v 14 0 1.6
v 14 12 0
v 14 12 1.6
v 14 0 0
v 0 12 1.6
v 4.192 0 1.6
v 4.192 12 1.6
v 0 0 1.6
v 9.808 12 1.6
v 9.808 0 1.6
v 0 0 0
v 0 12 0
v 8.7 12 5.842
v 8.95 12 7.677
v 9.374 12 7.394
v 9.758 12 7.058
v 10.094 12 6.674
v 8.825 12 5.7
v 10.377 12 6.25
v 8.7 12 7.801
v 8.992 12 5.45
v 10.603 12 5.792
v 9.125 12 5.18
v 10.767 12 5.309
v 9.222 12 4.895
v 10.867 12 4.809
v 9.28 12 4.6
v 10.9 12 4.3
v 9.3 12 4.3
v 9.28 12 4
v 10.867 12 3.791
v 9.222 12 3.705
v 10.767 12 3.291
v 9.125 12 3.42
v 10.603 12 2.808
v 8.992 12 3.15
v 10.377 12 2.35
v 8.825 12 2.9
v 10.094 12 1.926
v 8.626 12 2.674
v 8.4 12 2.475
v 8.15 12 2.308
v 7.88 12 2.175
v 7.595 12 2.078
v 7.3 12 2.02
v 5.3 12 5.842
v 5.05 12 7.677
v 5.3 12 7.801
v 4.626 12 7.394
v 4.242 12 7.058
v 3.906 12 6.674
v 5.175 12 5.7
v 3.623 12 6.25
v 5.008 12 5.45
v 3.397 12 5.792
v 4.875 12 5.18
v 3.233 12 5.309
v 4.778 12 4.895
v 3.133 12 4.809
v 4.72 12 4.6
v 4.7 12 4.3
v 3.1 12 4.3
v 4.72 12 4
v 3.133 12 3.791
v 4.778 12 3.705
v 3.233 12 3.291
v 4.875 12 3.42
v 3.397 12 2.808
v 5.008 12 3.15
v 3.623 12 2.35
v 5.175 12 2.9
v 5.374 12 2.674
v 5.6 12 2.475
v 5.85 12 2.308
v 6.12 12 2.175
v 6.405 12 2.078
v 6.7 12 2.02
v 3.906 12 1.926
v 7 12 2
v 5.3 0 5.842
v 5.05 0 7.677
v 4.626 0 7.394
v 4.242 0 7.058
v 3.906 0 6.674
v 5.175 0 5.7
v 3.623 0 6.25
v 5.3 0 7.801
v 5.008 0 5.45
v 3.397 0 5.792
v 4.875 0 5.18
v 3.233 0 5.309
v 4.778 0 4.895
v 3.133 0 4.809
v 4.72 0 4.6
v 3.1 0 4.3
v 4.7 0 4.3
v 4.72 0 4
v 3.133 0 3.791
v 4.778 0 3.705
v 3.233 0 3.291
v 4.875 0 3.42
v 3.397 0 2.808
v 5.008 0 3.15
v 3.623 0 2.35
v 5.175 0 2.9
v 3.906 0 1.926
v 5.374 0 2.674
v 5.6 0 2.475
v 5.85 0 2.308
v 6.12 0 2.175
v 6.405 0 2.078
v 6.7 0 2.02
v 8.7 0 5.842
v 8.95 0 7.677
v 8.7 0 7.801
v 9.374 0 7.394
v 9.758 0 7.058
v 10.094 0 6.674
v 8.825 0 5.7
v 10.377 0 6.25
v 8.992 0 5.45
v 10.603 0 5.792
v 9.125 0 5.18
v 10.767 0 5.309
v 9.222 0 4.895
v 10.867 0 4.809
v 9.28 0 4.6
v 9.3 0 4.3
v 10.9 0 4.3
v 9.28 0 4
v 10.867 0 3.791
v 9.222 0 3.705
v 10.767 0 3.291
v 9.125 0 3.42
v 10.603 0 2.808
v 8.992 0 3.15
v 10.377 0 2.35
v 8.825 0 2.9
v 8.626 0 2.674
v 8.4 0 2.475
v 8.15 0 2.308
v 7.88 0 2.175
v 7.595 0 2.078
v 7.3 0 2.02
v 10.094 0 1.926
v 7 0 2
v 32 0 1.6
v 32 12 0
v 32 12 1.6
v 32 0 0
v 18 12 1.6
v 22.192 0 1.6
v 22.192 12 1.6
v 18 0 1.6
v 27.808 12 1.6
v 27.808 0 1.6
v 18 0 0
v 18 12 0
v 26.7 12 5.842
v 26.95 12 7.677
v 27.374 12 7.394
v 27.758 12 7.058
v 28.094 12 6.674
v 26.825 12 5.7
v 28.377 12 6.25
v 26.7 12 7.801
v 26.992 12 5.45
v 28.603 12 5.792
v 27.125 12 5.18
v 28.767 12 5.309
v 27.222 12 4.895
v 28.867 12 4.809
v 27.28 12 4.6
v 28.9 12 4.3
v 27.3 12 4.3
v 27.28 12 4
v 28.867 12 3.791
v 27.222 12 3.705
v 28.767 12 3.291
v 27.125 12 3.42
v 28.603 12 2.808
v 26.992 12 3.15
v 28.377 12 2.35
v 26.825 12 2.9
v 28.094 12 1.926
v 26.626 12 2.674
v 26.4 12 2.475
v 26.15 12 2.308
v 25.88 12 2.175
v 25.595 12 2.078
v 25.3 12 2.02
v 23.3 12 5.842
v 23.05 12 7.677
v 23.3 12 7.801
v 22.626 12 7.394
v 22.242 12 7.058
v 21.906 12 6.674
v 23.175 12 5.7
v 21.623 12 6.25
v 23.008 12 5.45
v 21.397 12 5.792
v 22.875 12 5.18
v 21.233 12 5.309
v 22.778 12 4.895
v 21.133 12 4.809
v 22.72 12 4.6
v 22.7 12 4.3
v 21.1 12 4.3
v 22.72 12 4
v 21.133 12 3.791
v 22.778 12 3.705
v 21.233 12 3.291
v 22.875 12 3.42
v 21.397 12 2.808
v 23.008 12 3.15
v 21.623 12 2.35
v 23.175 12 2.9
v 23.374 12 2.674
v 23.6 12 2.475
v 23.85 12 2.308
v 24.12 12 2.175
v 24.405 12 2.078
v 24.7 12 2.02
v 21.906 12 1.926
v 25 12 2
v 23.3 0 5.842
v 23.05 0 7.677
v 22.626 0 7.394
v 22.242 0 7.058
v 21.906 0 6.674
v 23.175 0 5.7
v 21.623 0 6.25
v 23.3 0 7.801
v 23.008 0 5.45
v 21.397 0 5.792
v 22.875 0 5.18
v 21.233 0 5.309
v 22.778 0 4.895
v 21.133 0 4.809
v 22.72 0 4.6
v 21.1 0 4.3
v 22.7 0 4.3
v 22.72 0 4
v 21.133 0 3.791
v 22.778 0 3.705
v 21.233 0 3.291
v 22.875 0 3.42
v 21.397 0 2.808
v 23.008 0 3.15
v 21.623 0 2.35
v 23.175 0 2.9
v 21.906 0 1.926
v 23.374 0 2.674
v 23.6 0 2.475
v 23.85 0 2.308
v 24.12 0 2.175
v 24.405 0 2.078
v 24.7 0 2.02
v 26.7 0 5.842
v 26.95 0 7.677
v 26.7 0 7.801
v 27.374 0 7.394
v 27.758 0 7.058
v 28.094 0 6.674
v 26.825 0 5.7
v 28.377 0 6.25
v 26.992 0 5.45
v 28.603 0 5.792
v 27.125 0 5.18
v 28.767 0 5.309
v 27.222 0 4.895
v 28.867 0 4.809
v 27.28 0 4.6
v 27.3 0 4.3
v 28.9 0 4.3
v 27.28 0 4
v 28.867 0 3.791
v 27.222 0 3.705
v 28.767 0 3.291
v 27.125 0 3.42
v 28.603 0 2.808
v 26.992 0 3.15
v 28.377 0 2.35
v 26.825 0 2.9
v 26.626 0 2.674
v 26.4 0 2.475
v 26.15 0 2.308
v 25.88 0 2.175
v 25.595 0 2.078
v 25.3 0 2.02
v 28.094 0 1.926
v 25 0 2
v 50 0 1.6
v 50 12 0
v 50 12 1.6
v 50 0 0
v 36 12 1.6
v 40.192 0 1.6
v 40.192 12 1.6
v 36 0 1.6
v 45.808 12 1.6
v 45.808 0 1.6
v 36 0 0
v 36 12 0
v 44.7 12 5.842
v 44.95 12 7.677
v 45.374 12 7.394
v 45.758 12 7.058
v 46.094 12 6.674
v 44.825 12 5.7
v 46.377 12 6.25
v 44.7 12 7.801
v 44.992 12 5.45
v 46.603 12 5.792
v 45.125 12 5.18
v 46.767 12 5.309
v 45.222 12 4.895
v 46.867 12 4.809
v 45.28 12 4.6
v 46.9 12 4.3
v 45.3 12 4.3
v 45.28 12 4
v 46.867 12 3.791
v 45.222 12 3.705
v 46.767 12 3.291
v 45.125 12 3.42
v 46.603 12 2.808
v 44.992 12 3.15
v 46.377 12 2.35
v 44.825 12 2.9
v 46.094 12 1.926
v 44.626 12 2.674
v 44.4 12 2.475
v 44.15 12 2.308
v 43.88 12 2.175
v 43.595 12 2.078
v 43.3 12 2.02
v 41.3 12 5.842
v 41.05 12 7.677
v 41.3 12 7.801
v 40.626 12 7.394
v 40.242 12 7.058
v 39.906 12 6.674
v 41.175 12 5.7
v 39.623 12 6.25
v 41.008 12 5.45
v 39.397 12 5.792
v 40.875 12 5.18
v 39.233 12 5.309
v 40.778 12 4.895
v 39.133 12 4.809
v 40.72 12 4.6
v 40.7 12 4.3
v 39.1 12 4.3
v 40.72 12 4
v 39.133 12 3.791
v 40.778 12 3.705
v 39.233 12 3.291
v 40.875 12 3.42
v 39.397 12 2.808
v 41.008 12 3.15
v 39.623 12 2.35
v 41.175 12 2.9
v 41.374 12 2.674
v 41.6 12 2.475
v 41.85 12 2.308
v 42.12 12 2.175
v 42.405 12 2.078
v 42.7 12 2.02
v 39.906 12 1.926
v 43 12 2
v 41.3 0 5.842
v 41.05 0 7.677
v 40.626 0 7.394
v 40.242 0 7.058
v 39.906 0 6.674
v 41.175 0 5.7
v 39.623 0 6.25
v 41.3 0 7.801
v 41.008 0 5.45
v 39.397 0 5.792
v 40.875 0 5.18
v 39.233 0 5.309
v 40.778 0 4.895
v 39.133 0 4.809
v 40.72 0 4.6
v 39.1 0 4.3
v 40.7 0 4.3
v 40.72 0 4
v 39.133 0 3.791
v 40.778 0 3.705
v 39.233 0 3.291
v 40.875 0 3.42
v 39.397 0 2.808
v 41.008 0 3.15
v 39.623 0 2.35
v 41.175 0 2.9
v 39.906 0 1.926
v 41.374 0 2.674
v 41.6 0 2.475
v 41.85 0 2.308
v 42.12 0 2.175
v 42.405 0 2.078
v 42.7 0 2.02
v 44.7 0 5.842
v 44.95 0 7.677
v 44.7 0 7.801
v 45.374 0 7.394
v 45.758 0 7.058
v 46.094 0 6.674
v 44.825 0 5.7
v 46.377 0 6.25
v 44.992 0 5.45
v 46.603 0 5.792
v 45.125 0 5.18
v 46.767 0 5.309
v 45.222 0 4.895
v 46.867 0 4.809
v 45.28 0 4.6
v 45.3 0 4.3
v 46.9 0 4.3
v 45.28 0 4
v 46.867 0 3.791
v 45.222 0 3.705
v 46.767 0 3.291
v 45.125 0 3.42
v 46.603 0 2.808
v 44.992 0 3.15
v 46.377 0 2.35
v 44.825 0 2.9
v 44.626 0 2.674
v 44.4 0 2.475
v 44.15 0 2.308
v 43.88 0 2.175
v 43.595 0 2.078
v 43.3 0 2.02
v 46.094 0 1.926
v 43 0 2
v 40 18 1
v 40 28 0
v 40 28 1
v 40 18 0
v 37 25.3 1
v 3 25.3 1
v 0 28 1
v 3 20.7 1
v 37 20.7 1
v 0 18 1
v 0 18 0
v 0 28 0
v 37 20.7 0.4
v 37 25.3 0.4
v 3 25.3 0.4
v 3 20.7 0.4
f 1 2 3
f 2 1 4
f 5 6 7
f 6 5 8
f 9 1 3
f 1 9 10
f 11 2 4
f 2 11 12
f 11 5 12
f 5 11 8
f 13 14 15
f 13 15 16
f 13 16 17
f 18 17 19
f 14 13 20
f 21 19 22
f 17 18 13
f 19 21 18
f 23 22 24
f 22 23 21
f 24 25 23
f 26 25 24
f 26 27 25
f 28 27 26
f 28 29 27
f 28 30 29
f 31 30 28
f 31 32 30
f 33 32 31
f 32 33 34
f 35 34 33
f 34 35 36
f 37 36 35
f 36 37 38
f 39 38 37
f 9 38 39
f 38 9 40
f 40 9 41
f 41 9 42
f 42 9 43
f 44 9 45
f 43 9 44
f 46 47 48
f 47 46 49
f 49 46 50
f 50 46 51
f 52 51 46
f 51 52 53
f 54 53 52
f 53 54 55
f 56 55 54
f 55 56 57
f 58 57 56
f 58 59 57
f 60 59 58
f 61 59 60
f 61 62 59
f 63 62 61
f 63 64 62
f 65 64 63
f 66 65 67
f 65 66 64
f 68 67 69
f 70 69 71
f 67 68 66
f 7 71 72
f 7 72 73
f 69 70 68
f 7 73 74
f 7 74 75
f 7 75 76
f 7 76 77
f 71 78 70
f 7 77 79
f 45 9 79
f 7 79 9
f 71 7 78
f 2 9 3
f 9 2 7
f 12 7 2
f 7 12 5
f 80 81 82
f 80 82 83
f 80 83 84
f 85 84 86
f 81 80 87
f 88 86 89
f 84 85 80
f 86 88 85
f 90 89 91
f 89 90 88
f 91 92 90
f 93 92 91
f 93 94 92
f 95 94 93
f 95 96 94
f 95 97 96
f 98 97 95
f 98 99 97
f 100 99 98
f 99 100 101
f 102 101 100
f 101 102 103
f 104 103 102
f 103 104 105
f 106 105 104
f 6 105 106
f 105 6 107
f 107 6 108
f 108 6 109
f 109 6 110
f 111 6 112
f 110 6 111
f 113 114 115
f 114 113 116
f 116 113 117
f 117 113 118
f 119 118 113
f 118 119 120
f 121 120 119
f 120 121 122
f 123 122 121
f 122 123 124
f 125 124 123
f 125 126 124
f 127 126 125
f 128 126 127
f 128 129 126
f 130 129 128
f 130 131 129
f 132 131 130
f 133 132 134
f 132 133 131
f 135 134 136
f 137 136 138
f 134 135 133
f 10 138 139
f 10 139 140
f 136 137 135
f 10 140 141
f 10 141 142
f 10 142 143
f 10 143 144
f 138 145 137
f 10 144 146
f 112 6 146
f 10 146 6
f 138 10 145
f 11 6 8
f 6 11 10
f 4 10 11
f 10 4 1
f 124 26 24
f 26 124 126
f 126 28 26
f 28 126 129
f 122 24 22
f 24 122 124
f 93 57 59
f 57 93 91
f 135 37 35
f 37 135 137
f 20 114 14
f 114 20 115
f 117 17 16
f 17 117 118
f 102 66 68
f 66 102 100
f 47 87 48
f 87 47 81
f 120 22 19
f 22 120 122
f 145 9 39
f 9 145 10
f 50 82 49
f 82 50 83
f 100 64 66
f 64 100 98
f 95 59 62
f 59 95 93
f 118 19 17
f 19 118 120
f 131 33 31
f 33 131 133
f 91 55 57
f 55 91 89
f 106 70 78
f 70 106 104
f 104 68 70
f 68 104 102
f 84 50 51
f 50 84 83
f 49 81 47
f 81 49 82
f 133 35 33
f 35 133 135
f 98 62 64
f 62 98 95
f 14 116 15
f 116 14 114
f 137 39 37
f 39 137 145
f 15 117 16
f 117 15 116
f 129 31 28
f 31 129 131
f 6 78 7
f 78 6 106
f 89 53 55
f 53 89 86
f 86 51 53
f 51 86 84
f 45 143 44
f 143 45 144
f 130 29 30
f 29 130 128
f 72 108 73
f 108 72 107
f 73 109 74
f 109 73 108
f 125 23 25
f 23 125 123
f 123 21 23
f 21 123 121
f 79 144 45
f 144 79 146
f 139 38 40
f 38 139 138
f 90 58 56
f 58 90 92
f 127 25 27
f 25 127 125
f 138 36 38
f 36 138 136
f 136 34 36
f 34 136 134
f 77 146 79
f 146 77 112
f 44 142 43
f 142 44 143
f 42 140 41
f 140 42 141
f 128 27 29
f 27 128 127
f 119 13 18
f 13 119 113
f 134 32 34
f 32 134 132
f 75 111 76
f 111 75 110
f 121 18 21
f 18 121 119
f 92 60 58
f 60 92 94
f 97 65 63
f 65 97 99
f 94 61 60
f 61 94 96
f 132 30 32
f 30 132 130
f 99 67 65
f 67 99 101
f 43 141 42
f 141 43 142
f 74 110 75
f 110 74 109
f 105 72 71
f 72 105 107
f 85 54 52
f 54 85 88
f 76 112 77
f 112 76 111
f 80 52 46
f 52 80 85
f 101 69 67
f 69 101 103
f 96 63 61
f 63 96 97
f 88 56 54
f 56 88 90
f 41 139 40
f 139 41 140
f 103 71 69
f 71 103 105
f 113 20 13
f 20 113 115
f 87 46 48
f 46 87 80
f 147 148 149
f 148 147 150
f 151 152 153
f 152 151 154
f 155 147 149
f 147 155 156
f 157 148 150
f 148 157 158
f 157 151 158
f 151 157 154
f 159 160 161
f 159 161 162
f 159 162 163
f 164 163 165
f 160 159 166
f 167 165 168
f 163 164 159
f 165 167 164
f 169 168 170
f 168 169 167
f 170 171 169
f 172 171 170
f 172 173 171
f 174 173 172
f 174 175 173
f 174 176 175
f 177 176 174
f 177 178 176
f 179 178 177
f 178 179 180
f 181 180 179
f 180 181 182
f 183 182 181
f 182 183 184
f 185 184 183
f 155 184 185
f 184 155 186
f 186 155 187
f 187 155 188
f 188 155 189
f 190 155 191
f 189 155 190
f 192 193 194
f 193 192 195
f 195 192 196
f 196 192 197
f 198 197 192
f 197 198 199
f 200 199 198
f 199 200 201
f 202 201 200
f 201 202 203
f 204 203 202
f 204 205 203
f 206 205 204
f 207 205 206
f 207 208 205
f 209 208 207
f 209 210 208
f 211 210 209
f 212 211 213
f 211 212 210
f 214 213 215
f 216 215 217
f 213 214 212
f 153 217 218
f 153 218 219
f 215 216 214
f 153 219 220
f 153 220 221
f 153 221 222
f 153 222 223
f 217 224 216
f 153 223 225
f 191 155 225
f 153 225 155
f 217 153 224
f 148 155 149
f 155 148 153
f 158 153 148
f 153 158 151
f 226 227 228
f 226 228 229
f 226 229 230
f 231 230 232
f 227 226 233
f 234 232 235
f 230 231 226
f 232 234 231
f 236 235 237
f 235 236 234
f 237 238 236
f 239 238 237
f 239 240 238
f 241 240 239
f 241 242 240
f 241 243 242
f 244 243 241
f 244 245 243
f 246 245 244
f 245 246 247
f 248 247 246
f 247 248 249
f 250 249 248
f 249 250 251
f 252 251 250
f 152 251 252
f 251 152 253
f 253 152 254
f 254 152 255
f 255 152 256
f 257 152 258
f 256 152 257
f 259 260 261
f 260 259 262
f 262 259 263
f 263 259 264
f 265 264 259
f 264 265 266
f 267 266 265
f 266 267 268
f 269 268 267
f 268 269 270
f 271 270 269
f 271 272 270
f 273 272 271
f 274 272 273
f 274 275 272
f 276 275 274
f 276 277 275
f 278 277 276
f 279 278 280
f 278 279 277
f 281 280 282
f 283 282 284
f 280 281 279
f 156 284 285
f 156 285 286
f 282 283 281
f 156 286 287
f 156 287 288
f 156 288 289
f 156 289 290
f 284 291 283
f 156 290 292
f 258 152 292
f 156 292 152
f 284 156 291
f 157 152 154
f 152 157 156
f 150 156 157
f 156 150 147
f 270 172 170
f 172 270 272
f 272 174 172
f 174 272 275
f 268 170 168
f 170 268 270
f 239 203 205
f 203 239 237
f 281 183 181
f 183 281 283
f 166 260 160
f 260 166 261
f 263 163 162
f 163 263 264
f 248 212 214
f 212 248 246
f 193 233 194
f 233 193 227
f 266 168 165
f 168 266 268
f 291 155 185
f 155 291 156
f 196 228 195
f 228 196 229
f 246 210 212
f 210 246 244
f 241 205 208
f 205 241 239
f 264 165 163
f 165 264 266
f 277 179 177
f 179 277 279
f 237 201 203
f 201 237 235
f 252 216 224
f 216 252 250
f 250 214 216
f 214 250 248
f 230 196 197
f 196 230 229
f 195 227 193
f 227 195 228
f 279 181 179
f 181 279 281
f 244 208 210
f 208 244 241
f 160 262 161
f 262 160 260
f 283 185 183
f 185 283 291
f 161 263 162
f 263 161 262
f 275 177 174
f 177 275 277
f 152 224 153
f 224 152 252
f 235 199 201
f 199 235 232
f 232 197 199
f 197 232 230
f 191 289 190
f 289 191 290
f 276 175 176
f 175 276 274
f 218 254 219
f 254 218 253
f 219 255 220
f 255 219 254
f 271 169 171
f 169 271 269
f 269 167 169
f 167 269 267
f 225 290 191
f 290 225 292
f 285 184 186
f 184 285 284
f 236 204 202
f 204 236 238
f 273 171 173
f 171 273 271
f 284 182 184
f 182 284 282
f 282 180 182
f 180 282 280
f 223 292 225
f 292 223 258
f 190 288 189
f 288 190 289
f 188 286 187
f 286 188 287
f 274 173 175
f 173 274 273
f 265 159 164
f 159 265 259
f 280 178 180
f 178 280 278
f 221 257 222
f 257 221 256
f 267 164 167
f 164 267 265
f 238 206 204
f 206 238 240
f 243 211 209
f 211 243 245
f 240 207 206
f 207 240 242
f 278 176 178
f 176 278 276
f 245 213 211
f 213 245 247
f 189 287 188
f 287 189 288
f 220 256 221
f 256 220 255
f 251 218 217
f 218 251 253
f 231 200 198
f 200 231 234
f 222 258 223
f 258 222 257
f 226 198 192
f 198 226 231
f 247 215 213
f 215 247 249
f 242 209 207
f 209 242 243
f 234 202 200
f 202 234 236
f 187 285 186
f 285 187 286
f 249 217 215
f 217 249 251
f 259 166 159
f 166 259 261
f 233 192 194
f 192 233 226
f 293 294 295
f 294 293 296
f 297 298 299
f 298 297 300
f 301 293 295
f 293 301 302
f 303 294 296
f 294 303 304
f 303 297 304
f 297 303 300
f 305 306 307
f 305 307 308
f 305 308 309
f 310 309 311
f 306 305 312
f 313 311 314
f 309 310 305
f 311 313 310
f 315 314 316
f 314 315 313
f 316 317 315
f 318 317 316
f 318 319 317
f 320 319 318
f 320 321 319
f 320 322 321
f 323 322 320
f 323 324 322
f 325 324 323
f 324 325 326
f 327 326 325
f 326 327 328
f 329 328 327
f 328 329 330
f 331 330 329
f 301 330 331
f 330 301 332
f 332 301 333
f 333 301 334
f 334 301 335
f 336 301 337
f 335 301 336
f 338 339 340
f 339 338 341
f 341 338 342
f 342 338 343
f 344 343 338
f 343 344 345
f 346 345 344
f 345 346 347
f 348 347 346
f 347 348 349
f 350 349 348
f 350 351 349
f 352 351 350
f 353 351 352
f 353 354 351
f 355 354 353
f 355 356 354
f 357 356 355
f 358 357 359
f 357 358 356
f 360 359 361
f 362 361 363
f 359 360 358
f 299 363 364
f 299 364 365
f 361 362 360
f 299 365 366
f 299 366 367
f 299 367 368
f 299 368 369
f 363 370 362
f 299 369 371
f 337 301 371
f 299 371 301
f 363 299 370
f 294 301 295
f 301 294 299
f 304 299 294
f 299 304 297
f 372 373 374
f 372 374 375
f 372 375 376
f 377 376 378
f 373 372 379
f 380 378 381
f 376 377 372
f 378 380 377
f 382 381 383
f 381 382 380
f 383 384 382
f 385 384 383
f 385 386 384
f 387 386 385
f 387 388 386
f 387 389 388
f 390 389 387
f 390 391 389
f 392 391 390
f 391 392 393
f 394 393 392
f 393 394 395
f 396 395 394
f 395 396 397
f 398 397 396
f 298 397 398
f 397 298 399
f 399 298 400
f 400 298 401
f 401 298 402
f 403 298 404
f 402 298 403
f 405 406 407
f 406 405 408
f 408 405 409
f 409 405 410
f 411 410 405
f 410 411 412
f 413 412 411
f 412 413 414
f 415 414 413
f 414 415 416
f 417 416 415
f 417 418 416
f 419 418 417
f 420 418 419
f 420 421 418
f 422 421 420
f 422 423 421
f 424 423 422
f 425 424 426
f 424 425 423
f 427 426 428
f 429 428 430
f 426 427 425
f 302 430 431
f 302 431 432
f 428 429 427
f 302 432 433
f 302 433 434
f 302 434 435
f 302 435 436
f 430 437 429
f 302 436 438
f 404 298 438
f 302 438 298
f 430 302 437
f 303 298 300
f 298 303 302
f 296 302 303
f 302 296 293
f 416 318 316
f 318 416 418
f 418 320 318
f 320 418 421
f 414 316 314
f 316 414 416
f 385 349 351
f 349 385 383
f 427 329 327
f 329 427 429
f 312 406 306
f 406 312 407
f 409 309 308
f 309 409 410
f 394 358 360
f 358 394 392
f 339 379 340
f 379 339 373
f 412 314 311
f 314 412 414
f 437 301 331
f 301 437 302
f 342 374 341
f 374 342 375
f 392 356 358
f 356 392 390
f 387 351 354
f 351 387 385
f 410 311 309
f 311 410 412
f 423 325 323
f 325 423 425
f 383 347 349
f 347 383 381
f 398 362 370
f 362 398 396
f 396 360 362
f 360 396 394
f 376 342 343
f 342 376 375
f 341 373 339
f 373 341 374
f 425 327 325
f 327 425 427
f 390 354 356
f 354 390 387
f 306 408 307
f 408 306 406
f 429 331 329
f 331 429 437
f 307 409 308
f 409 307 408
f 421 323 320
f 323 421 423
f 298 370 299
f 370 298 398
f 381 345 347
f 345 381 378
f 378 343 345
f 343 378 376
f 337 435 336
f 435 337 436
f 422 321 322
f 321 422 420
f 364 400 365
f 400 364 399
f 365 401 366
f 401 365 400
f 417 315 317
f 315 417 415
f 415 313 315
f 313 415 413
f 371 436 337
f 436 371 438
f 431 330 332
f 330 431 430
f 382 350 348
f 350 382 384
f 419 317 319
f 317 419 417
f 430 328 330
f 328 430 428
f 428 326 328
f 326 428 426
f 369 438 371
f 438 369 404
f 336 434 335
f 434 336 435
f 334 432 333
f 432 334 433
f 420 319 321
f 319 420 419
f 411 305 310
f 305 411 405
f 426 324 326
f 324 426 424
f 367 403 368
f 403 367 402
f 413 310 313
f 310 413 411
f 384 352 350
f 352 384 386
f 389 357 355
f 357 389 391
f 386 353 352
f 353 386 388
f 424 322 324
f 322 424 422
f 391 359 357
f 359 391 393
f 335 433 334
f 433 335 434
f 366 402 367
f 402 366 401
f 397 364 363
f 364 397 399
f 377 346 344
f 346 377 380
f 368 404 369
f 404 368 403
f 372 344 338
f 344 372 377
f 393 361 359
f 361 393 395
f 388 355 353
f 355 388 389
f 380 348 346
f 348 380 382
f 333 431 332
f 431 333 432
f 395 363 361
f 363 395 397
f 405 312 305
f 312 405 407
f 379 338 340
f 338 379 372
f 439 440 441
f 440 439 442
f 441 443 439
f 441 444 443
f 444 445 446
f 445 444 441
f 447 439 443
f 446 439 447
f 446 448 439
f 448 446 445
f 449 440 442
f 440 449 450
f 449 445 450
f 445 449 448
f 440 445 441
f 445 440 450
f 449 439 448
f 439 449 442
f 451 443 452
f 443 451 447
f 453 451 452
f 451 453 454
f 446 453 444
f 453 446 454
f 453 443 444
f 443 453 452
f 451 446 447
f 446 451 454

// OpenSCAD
// file: params.scad
// Every measurement of the parts the enclosures hold, in millimetres, in one place. The values come from the sellers' sheets of the parts in
// docs/hardware.md; measure the parts you received with a caliper and change them here before the final print (print fit_test.scad first).

$fn = 48;

// Fit and print
clearance = 0.4;        // gap around a part so it slides in
wall = 2.4;             // six perimeters of a 0.4 mm nozzle
floor_thickness = 2.0;
lid_thickness = 2.0;
lip = 1.6;              // height of the lid's inner lip

// ESP32 DevKit V1 (ESP-WROOM-32). The 30-pin board is 51.5 x 28.3; the 38-pin one is 55.3 x 28.3.
esp32_length = 51.5;
esp32_width = 28.3;
esp32_pcb = 1.6;
esp32_under = 9.0;      // header pins and solder below the board, so it rests on its edges
esp32_above = 6.0;      // the WROOM can and the buttons
usb_width = 12.0;       // opening for a micro-USB or USB-C plug with its overmould
usb_height = 8.0;

// HX711 module (green board)
hx711_length = 34.0;
hx711_width = 21.0;
hx711_height = 4.0;

// Perfboard with the buzzer transistor and the resistors
perf_length = 40.0;
perf_width = 30.0;

// Active buzzer, 12 x 9.5 mm
buzzer_diameter = 12.0;
buzzer_height = 9.5;

// RGB LED, 5 mm (10 mm: change to 10.0)
led_diameter = 5.0;

// Cables
probe_cable = 4.2;      // DS18B20 waterproof probe cable
reed_cable = 3.2;       // MC-38 cable

// Load cell, 5 kg bar (TAL220 type): two M5 holes at one end, two M4 at the other, 15 mm apart, 5 mm from each end
cell_length = 80.0;
cell_section = 12.7;
cell_hole_spacing = 15.0;
cell_hole_from_end = 5.0;
m4 = 4.4;
m5 = 5.4;
m3 = 3.3;

// MC-38 reed switch and its magnet
reed_length = 27.0;
reed_width = 14.0;
reed_height = 8.0;
magnet_length = 27.0;
magnet_width = 10.0;
magnet_height = 8.0;

// Mounting
disc_magnet_diameter = 10.0;   // 10 x 3 mm neodymium discs
disc_magnet_height = 3.0;
rubber_foot = 8.0;             // adhesive rubber bumpers
// main file
// Clips that guide the probe cable along the fridge wall and across the door gasket. The part on the gasket is a flat bridge only 1 mm thick,
// so the door still seals; the clips either side hold the cable so a slammed door never pinches it.
//
// part = "clip" | "bridge" | "all"

include <params.scad>

part = "all";

module clip() {
  hole = probe_cable + clearance;
  centre = 1.6 + hole / 2 + 0.4;
  difference() {
    union() {
      cube([14, 12, 1.6]);
      translate([7, 12, centre]) rotate([90, 0, 0]) cylinder(d = hole + 2 * 1.6, h = 12);
    }
    translate([7, 13, centre]) rotate([90, 0, 0]) cylinder(d = hole, h = 14);
    // Opening on top, a little narrower than the cable, to press it in
    translate([7 - (probe_cable - 0.8) / 2, -1, centre]) cube([probe_cable - 0.8, 14, hole]);
  }
}

module bridge() {
  difference() {
    cube([40, 10, 1.0]);
    translate([3, 5 - probe_cable / 2 - 0.2, 0.4]) cube([34, probe_cable + 0.4, 1]);
  }
}

if (part == "clip") clip();
if (part == "bridge") bridge();
if (part == "all") {
  for (i = [0 : 2]) translate([i * 18, 0, 0]) clip();
  translate([0, 18, 0]) bridge();
}
